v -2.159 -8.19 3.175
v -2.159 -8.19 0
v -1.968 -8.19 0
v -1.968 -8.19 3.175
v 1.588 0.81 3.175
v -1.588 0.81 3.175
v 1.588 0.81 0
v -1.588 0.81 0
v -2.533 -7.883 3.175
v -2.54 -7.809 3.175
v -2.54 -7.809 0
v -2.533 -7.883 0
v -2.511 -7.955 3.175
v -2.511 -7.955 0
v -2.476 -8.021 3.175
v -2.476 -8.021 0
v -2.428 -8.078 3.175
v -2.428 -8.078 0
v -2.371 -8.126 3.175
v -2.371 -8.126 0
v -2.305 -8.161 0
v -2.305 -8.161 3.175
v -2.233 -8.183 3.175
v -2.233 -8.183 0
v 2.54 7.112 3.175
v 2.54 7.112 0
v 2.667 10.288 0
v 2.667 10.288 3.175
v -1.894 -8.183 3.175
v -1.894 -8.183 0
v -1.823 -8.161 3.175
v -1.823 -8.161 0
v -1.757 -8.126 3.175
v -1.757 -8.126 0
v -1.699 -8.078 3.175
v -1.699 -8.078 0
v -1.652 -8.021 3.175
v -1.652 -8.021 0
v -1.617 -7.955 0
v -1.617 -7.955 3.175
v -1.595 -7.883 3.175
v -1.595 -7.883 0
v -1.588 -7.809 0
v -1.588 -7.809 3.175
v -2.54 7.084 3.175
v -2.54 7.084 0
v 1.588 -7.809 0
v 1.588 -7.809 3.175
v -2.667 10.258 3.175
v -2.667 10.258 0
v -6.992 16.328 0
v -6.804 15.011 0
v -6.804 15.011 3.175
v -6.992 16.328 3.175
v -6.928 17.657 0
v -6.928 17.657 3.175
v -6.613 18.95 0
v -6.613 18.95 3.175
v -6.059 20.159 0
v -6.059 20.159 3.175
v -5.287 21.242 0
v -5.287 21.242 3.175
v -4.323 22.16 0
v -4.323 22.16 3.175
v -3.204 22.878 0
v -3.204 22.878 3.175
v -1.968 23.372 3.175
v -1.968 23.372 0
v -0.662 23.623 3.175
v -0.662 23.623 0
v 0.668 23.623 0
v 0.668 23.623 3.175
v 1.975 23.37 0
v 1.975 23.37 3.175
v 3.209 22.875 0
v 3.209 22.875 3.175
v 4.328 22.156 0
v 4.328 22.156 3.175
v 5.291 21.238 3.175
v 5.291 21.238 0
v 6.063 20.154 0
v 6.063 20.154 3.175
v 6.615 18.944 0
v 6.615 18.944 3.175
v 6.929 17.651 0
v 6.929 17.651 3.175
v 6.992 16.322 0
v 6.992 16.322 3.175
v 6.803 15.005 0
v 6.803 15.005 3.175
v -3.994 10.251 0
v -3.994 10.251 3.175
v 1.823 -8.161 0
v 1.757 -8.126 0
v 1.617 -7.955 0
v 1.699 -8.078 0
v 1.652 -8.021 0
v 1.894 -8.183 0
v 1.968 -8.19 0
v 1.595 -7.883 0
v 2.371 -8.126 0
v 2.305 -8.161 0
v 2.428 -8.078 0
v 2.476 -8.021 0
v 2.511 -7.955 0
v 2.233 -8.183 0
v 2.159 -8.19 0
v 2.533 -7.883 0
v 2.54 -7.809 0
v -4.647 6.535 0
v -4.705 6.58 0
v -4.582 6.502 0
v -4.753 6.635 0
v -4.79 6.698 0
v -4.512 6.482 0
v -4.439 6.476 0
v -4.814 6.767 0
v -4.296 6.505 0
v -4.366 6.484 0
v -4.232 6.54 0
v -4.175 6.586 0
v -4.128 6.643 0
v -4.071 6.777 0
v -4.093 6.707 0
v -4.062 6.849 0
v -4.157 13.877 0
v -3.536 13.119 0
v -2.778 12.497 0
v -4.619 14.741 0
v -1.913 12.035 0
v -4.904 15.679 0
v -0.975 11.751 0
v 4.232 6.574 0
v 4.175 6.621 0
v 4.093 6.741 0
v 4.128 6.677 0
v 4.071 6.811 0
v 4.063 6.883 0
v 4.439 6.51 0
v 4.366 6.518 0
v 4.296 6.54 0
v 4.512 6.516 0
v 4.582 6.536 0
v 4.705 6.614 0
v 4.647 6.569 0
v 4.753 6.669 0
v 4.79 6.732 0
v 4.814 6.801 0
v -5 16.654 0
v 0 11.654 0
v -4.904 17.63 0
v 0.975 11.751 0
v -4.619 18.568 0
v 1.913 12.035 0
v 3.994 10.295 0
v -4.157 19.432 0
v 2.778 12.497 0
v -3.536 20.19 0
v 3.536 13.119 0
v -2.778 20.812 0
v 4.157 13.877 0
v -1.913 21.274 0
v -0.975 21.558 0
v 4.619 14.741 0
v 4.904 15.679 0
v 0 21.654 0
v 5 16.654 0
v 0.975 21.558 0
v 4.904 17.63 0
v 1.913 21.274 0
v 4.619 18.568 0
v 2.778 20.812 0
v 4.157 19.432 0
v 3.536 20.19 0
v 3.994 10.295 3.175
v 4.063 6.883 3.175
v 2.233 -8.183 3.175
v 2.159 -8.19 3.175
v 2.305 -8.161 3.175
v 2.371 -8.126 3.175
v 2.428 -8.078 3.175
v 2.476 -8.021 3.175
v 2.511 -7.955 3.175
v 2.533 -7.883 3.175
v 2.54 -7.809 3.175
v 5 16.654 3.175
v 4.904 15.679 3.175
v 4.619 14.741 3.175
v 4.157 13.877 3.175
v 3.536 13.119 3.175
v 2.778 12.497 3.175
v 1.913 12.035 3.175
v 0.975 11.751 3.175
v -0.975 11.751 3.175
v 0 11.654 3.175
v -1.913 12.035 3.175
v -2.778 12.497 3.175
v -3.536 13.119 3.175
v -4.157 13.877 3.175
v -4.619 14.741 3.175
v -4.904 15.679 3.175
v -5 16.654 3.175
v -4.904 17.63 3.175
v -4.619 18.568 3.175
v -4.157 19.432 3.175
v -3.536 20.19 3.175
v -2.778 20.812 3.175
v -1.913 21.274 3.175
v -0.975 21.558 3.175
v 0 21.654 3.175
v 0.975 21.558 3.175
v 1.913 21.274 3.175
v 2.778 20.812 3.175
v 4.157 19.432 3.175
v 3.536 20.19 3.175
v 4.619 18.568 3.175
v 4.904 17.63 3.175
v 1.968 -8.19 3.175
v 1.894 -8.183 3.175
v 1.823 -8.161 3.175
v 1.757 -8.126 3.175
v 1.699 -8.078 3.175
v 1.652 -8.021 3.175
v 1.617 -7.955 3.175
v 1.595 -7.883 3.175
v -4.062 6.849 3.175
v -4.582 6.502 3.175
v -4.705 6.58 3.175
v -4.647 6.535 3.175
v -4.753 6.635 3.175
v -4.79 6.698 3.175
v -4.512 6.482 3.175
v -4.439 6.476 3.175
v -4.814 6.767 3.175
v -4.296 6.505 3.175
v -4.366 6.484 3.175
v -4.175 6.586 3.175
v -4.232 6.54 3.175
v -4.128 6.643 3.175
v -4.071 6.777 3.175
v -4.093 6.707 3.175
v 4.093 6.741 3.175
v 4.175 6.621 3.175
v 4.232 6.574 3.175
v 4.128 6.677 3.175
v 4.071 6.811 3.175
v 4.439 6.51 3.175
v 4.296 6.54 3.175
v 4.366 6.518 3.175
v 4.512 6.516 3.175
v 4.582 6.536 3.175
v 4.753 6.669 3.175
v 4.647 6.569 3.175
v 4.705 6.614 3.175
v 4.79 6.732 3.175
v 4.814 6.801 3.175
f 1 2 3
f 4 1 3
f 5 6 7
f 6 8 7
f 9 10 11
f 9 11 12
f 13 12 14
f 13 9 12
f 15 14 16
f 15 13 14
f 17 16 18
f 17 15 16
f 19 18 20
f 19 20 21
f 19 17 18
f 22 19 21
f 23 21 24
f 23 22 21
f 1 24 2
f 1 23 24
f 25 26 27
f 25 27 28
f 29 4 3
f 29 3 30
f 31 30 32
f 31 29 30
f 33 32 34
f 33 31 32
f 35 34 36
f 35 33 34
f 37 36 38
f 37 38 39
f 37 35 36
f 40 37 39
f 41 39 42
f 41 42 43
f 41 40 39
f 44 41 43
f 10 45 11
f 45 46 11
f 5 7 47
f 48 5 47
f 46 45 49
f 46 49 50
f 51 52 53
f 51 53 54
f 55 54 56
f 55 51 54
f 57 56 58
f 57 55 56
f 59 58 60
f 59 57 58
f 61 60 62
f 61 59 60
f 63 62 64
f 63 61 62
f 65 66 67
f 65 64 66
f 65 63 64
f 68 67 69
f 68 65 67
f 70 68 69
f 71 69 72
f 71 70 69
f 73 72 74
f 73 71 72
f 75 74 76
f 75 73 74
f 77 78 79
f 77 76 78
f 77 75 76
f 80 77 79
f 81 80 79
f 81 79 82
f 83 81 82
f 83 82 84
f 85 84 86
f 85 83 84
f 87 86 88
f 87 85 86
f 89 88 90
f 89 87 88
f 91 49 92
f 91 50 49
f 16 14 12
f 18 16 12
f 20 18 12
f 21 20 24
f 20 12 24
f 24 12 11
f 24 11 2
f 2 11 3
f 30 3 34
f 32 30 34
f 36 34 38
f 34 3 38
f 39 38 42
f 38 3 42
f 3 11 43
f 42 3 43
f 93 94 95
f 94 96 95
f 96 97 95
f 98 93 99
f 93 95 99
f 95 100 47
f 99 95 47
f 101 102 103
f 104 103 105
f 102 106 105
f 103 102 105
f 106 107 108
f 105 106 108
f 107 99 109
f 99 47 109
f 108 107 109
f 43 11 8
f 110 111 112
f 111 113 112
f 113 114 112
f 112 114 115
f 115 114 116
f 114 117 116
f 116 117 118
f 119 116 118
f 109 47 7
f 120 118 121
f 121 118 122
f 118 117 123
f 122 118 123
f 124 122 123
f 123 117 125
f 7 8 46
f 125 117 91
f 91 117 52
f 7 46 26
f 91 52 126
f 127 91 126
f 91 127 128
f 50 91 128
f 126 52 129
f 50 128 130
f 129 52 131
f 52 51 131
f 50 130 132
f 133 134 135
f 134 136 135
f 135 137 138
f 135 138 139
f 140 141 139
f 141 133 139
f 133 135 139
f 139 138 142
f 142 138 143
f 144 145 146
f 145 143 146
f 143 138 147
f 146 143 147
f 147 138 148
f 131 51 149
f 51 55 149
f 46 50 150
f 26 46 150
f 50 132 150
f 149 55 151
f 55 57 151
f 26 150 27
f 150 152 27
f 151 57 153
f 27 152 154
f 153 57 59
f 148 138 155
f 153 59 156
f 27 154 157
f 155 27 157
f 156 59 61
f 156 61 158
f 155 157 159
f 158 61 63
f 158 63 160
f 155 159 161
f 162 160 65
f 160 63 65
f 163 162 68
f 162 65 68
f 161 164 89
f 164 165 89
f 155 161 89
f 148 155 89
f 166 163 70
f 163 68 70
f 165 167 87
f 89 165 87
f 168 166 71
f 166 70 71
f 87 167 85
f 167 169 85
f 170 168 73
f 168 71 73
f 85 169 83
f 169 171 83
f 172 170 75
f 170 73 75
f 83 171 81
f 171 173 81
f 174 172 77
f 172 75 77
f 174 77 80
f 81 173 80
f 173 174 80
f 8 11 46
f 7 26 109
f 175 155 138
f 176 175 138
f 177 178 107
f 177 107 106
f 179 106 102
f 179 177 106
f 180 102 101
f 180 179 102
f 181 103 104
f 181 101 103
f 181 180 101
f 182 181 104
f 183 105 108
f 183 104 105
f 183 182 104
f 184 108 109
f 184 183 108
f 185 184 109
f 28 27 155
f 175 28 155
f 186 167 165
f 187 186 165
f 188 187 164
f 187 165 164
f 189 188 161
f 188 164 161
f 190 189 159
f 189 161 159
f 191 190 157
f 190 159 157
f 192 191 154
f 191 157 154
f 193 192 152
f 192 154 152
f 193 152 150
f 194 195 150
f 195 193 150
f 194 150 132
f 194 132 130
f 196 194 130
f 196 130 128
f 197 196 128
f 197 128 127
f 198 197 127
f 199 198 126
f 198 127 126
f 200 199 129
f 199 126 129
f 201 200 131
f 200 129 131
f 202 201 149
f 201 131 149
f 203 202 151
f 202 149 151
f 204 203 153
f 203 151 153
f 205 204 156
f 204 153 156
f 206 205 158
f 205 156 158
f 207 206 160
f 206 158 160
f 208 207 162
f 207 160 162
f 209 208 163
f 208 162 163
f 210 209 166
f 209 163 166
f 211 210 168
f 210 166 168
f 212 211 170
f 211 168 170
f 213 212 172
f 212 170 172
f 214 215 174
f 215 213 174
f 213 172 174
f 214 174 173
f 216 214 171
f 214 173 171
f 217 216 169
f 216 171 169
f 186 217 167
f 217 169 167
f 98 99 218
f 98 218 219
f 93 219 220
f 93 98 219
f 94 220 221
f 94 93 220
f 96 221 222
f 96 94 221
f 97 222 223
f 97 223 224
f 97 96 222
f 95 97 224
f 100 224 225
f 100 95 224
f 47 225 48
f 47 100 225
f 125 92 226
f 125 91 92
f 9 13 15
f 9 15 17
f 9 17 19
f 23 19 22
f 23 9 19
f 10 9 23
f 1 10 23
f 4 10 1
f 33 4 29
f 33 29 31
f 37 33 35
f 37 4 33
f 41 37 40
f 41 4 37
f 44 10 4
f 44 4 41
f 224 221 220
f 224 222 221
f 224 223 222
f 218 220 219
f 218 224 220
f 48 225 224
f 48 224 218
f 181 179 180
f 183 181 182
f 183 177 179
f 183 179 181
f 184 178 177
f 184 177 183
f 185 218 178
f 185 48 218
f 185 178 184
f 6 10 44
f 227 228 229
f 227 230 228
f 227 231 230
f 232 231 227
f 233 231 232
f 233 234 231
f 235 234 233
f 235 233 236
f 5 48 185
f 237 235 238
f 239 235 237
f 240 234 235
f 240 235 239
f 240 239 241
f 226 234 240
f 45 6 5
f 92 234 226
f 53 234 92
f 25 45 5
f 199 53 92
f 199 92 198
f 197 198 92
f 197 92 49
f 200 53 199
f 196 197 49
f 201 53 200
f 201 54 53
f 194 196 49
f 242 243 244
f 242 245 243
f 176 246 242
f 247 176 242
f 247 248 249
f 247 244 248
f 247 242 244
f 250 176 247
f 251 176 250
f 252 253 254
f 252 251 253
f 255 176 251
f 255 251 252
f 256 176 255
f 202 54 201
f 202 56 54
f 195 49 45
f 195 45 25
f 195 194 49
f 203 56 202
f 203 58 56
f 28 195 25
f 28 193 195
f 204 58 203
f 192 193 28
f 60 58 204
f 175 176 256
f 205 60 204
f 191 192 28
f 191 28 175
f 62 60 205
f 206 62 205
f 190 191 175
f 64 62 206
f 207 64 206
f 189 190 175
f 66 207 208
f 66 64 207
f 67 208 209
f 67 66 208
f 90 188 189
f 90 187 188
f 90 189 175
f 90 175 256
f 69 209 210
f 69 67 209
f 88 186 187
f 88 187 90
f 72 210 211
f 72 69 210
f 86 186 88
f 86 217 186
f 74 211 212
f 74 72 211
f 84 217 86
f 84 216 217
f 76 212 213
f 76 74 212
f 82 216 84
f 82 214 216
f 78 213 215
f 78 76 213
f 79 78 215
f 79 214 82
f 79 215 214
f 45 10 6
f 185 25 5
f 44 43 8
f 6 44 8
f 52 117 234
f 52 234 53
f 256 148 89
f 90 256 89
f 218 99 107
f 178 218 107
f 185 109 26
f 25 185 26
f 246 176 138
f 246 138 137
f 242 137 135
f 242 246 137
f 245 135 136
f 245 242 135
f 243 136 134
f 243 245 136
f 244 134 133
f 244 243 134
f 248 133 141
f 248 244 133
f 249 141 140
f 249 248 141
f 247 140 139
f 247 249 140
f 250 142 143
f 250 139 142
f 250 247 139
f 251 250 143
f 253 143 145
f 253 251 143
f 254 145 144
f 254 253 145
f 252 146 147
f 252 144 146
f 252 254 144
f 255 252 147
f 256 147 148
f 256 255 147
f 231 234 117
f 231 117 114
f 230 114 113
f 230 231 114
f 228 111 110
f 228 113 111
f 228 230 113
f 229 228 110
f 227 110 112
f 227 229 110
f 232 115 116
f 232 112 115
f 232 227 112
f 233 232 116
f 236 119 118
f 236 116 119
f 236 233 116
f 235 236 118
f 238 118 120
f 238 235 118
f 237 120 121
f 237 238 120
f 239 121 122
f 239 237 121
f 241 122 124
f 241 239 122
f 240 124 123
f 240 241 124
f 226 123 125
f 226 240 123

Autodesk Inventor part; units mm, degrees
ref_plane "YZ Plane" through (0, 0, 0) normal (1, 0, 0) x (0, 1, 0)
ref_plane "XZ Plane" through (0, 0, 0) normal (0, 1, 0) x (-1, 0, 0)
ref_plane "XY Plane" through (0, 0, 0) normal (0, 0, 1) x (1, 0, 0)
sketch "Sketch1" plane through (0, 0, 0) normal (0, 0, 1) x (1, 0, 0)
  line L0 (-2.54, -8.19) -> (2.54, -8.19)
  line L1 (2.54, -8.19) -> (2.54, 8.19)
  line L2 (-2.54, 8.19) -> (-2.54, -8.19)
  line L3 (-2.54, -8.19) -> (2.54, 8.19) construction
  line L4 (2.54, -8.19) -> (-2.54, 8.19) construction
  circle A0 centre (0, 16.6545) radius 2.5 construction
  circle A1 centre (0, 16.6545) radius 5
  arc A2 (6.8029, 15.0051) -> (-6.8044, 15.0114) centre (0, 16.6545) ccw
  line L5 (-2.54, 8.19) -> (-2.54, 10.2591)
  line L6 (2.54, 8.19) -> (2.54, 10.2869)
  line L7 (0, 0) -> (0, 10.7842) construction
  line L8 (-2.54, 10.2591) -> (-3.9944, 10.2511)
  line L9 (2.54, 10.2869) -> (3.9944, 10.2948)
  line L10 (-3.9944, 10.2511) -> (-4.1214, 3.9003)
  line L11 (3.9944, 10.2948) -> (4.1214, 3.9454)
  line L12 (-4.1214, 3.9003) -> (-6.8044, 15.0114)
  line L13 (4.1214, 3.9454) -> (6.8029, 15.0051)
  line L14 (0, 0) -> (0, 22.9511) construction
  point P0 (-3.2672, 10.2551)
  dimension "d2" = 5
  dimension "d3" = 10
  dimension "d4" = 14
  dimension "d8" = 1.5815
  dimension "d9" = 1.5815
  dimension "d10" = 6.35
  dimension "d11" = 6.35
  dimension "d18" = 1.4545
  dimension "d19" = 1.4545
  dimension "d31" = 2.54
  dimension "d32" = 2.54
  dimension "d33" = 0
extrude "Plate1" add sketch "Sketch1" along normal blind 3.175
sketch "Sketch2" plane through (0, 0, 0) normal (0, 0, -1) x (-1, 0, 0)
  circle A0 centre (0, 16.6545) radius 5 projected
  line L0 (-3.9944, 10.2948) -> (-4.1214, 3.9454) projected
  line L1 (-2.54, 10.2869) -> (-3.9944, 10.2948) projected
  line L2 (-2.54, -8.19) -> (-2.54, 10.2869) projected
  line L3 (2.54, -8.19) -> (-2.54, -8.19) projected
  line L4 (2.54, 10.2591) -> (2.54, -8.19) projected
  line L5 (3.9944, 10.2511) -> (2.54, 10.2591) projected
  line L6 (4.1214, 3.9003) -> (3.9944, 10.2511) projected
  line L7 (6.8044, 15.0114) -> (4.1214, 3.9003) projected
  arc A1 (6.8044, 15.0114) -> (-6.8029, 15.0051) centre (0, 16.6545) ccw projected
  line L8 (-4.1214, 3.9454) -> (-6.8029, 15.0051) projected
  line L9 (-1.5875, -17.19) -> (1.5875, -17.19)
  line L10 (1.5875, -17.19) -> (1.5875, 0.81)
  line L11 (1.5875, 0.81) -> (-1.5875, 0.81)
  line L12 (-1.5875, 0.81) -> (-1.5875, -17.19)
  line L13 (-1.5875, -17.19) -> (1.5875, 0.81) construction
  line L14 (1.5875, -17.19) -> (-1.5875, 0.81) construction
  point P0 (0, 0)
  point P1 (0, -8.19)
  dimension "d14" = 3.175
extrude "Extrusion1" cut sketch "Sketch2" against normal blind 25.4 contours L12 L11 L10 L3 | L3 L10 L9 L12
sketch "Sketch3" plane through (0, 0, 3.175) normal (0, 0, 1) x (1, 0, 0)
  circle A0 centre (-37.757, 0) radius 3
  line L0 (-39.3445, -2.5456) -> (-36.1695, -2.5456)
  line L1 (-36.1695, -2.5456) -> (-36.1695, 2.5456)
  line L2 (-36.1695, 2.5456) -> (-39.3445, 2.5456)
  line L3 (-39.3445, 2.5456) -> (-39.3445, -2.5456)
  line L4 (-39.3445, -2.5456) -> (-36.1695, 2.5456) construction
  line L5 (-36.1695, -2.5456) -> (-39.3445, 2.5456) construction
  circle A1 centre (-37.757, 0) radius 4
  point P0 (0, 0)
  point P1 (-37.757, 3)
  point P2 (-37.757, 4)
  dimension "d35" = 8
  dimension "d28" = 6
  dimension "d29" = 3.175
  dimension "d30" = 5.0911
  dimension "d34" = 0.4545
  dimension "d36" = 1.4545
fillet "Fillet4" radius 0.381 6 edges at (-4.1214, 3.9003, 1.5875) (4.1214, 3.9454, 1.5875) (-2.54, -8.19, 1.5875) (-1.5875, -8.19, 1.5875) (1.5875, -8.19, 1.5875) (2.54, -8.19, 1.5875)
ref_plane "Work Plane1" through (0, 10.2591, 0) normal (-1, 0, 0) x (0, 0, 1)
ref_plane "Work Plane2" through (0, 0, 1.5875) normal (0, 0, 1) x (1, 0, 0)
chamfer "Chamfer3" distance 0.127 distance2 3.175 1 edges at (-2.54, 10.2591, 1.5875) measured on face at (-3.5096, 10.2538, 1.0583)
chamfer "Chamfer4" distance 3.175 distance2 0.127 1 edges at (2.54, 10.2869, 1.5875) measured on face at (2.54, -1.7771, 1.0583)
equation "\"d18\" = d36"
equation "\"d19\" = d36"
equation "\"BendRadius\" = Thickness"
equation "\"BendReliefWidth\" = Thickness"
equation "\"BendReliefDepth\" = 0.5 * Thickness"
equation "\"CornerReliefSize\" = 4 * Thickness"
equation "\"MinimumRemnant\" = 2 * Thickness"
equation "\"TransitionRadius\" = BendRadius"
equation "\"JacobiRadiusSize\" = BendRadius"
equation "\"GapSize\" = Thickness"
equation "\"d12\" = BendRadius"
equation "\"Thickness\" = 3.175"
properties part number "8mm OD 6mm ID Rod End125"
